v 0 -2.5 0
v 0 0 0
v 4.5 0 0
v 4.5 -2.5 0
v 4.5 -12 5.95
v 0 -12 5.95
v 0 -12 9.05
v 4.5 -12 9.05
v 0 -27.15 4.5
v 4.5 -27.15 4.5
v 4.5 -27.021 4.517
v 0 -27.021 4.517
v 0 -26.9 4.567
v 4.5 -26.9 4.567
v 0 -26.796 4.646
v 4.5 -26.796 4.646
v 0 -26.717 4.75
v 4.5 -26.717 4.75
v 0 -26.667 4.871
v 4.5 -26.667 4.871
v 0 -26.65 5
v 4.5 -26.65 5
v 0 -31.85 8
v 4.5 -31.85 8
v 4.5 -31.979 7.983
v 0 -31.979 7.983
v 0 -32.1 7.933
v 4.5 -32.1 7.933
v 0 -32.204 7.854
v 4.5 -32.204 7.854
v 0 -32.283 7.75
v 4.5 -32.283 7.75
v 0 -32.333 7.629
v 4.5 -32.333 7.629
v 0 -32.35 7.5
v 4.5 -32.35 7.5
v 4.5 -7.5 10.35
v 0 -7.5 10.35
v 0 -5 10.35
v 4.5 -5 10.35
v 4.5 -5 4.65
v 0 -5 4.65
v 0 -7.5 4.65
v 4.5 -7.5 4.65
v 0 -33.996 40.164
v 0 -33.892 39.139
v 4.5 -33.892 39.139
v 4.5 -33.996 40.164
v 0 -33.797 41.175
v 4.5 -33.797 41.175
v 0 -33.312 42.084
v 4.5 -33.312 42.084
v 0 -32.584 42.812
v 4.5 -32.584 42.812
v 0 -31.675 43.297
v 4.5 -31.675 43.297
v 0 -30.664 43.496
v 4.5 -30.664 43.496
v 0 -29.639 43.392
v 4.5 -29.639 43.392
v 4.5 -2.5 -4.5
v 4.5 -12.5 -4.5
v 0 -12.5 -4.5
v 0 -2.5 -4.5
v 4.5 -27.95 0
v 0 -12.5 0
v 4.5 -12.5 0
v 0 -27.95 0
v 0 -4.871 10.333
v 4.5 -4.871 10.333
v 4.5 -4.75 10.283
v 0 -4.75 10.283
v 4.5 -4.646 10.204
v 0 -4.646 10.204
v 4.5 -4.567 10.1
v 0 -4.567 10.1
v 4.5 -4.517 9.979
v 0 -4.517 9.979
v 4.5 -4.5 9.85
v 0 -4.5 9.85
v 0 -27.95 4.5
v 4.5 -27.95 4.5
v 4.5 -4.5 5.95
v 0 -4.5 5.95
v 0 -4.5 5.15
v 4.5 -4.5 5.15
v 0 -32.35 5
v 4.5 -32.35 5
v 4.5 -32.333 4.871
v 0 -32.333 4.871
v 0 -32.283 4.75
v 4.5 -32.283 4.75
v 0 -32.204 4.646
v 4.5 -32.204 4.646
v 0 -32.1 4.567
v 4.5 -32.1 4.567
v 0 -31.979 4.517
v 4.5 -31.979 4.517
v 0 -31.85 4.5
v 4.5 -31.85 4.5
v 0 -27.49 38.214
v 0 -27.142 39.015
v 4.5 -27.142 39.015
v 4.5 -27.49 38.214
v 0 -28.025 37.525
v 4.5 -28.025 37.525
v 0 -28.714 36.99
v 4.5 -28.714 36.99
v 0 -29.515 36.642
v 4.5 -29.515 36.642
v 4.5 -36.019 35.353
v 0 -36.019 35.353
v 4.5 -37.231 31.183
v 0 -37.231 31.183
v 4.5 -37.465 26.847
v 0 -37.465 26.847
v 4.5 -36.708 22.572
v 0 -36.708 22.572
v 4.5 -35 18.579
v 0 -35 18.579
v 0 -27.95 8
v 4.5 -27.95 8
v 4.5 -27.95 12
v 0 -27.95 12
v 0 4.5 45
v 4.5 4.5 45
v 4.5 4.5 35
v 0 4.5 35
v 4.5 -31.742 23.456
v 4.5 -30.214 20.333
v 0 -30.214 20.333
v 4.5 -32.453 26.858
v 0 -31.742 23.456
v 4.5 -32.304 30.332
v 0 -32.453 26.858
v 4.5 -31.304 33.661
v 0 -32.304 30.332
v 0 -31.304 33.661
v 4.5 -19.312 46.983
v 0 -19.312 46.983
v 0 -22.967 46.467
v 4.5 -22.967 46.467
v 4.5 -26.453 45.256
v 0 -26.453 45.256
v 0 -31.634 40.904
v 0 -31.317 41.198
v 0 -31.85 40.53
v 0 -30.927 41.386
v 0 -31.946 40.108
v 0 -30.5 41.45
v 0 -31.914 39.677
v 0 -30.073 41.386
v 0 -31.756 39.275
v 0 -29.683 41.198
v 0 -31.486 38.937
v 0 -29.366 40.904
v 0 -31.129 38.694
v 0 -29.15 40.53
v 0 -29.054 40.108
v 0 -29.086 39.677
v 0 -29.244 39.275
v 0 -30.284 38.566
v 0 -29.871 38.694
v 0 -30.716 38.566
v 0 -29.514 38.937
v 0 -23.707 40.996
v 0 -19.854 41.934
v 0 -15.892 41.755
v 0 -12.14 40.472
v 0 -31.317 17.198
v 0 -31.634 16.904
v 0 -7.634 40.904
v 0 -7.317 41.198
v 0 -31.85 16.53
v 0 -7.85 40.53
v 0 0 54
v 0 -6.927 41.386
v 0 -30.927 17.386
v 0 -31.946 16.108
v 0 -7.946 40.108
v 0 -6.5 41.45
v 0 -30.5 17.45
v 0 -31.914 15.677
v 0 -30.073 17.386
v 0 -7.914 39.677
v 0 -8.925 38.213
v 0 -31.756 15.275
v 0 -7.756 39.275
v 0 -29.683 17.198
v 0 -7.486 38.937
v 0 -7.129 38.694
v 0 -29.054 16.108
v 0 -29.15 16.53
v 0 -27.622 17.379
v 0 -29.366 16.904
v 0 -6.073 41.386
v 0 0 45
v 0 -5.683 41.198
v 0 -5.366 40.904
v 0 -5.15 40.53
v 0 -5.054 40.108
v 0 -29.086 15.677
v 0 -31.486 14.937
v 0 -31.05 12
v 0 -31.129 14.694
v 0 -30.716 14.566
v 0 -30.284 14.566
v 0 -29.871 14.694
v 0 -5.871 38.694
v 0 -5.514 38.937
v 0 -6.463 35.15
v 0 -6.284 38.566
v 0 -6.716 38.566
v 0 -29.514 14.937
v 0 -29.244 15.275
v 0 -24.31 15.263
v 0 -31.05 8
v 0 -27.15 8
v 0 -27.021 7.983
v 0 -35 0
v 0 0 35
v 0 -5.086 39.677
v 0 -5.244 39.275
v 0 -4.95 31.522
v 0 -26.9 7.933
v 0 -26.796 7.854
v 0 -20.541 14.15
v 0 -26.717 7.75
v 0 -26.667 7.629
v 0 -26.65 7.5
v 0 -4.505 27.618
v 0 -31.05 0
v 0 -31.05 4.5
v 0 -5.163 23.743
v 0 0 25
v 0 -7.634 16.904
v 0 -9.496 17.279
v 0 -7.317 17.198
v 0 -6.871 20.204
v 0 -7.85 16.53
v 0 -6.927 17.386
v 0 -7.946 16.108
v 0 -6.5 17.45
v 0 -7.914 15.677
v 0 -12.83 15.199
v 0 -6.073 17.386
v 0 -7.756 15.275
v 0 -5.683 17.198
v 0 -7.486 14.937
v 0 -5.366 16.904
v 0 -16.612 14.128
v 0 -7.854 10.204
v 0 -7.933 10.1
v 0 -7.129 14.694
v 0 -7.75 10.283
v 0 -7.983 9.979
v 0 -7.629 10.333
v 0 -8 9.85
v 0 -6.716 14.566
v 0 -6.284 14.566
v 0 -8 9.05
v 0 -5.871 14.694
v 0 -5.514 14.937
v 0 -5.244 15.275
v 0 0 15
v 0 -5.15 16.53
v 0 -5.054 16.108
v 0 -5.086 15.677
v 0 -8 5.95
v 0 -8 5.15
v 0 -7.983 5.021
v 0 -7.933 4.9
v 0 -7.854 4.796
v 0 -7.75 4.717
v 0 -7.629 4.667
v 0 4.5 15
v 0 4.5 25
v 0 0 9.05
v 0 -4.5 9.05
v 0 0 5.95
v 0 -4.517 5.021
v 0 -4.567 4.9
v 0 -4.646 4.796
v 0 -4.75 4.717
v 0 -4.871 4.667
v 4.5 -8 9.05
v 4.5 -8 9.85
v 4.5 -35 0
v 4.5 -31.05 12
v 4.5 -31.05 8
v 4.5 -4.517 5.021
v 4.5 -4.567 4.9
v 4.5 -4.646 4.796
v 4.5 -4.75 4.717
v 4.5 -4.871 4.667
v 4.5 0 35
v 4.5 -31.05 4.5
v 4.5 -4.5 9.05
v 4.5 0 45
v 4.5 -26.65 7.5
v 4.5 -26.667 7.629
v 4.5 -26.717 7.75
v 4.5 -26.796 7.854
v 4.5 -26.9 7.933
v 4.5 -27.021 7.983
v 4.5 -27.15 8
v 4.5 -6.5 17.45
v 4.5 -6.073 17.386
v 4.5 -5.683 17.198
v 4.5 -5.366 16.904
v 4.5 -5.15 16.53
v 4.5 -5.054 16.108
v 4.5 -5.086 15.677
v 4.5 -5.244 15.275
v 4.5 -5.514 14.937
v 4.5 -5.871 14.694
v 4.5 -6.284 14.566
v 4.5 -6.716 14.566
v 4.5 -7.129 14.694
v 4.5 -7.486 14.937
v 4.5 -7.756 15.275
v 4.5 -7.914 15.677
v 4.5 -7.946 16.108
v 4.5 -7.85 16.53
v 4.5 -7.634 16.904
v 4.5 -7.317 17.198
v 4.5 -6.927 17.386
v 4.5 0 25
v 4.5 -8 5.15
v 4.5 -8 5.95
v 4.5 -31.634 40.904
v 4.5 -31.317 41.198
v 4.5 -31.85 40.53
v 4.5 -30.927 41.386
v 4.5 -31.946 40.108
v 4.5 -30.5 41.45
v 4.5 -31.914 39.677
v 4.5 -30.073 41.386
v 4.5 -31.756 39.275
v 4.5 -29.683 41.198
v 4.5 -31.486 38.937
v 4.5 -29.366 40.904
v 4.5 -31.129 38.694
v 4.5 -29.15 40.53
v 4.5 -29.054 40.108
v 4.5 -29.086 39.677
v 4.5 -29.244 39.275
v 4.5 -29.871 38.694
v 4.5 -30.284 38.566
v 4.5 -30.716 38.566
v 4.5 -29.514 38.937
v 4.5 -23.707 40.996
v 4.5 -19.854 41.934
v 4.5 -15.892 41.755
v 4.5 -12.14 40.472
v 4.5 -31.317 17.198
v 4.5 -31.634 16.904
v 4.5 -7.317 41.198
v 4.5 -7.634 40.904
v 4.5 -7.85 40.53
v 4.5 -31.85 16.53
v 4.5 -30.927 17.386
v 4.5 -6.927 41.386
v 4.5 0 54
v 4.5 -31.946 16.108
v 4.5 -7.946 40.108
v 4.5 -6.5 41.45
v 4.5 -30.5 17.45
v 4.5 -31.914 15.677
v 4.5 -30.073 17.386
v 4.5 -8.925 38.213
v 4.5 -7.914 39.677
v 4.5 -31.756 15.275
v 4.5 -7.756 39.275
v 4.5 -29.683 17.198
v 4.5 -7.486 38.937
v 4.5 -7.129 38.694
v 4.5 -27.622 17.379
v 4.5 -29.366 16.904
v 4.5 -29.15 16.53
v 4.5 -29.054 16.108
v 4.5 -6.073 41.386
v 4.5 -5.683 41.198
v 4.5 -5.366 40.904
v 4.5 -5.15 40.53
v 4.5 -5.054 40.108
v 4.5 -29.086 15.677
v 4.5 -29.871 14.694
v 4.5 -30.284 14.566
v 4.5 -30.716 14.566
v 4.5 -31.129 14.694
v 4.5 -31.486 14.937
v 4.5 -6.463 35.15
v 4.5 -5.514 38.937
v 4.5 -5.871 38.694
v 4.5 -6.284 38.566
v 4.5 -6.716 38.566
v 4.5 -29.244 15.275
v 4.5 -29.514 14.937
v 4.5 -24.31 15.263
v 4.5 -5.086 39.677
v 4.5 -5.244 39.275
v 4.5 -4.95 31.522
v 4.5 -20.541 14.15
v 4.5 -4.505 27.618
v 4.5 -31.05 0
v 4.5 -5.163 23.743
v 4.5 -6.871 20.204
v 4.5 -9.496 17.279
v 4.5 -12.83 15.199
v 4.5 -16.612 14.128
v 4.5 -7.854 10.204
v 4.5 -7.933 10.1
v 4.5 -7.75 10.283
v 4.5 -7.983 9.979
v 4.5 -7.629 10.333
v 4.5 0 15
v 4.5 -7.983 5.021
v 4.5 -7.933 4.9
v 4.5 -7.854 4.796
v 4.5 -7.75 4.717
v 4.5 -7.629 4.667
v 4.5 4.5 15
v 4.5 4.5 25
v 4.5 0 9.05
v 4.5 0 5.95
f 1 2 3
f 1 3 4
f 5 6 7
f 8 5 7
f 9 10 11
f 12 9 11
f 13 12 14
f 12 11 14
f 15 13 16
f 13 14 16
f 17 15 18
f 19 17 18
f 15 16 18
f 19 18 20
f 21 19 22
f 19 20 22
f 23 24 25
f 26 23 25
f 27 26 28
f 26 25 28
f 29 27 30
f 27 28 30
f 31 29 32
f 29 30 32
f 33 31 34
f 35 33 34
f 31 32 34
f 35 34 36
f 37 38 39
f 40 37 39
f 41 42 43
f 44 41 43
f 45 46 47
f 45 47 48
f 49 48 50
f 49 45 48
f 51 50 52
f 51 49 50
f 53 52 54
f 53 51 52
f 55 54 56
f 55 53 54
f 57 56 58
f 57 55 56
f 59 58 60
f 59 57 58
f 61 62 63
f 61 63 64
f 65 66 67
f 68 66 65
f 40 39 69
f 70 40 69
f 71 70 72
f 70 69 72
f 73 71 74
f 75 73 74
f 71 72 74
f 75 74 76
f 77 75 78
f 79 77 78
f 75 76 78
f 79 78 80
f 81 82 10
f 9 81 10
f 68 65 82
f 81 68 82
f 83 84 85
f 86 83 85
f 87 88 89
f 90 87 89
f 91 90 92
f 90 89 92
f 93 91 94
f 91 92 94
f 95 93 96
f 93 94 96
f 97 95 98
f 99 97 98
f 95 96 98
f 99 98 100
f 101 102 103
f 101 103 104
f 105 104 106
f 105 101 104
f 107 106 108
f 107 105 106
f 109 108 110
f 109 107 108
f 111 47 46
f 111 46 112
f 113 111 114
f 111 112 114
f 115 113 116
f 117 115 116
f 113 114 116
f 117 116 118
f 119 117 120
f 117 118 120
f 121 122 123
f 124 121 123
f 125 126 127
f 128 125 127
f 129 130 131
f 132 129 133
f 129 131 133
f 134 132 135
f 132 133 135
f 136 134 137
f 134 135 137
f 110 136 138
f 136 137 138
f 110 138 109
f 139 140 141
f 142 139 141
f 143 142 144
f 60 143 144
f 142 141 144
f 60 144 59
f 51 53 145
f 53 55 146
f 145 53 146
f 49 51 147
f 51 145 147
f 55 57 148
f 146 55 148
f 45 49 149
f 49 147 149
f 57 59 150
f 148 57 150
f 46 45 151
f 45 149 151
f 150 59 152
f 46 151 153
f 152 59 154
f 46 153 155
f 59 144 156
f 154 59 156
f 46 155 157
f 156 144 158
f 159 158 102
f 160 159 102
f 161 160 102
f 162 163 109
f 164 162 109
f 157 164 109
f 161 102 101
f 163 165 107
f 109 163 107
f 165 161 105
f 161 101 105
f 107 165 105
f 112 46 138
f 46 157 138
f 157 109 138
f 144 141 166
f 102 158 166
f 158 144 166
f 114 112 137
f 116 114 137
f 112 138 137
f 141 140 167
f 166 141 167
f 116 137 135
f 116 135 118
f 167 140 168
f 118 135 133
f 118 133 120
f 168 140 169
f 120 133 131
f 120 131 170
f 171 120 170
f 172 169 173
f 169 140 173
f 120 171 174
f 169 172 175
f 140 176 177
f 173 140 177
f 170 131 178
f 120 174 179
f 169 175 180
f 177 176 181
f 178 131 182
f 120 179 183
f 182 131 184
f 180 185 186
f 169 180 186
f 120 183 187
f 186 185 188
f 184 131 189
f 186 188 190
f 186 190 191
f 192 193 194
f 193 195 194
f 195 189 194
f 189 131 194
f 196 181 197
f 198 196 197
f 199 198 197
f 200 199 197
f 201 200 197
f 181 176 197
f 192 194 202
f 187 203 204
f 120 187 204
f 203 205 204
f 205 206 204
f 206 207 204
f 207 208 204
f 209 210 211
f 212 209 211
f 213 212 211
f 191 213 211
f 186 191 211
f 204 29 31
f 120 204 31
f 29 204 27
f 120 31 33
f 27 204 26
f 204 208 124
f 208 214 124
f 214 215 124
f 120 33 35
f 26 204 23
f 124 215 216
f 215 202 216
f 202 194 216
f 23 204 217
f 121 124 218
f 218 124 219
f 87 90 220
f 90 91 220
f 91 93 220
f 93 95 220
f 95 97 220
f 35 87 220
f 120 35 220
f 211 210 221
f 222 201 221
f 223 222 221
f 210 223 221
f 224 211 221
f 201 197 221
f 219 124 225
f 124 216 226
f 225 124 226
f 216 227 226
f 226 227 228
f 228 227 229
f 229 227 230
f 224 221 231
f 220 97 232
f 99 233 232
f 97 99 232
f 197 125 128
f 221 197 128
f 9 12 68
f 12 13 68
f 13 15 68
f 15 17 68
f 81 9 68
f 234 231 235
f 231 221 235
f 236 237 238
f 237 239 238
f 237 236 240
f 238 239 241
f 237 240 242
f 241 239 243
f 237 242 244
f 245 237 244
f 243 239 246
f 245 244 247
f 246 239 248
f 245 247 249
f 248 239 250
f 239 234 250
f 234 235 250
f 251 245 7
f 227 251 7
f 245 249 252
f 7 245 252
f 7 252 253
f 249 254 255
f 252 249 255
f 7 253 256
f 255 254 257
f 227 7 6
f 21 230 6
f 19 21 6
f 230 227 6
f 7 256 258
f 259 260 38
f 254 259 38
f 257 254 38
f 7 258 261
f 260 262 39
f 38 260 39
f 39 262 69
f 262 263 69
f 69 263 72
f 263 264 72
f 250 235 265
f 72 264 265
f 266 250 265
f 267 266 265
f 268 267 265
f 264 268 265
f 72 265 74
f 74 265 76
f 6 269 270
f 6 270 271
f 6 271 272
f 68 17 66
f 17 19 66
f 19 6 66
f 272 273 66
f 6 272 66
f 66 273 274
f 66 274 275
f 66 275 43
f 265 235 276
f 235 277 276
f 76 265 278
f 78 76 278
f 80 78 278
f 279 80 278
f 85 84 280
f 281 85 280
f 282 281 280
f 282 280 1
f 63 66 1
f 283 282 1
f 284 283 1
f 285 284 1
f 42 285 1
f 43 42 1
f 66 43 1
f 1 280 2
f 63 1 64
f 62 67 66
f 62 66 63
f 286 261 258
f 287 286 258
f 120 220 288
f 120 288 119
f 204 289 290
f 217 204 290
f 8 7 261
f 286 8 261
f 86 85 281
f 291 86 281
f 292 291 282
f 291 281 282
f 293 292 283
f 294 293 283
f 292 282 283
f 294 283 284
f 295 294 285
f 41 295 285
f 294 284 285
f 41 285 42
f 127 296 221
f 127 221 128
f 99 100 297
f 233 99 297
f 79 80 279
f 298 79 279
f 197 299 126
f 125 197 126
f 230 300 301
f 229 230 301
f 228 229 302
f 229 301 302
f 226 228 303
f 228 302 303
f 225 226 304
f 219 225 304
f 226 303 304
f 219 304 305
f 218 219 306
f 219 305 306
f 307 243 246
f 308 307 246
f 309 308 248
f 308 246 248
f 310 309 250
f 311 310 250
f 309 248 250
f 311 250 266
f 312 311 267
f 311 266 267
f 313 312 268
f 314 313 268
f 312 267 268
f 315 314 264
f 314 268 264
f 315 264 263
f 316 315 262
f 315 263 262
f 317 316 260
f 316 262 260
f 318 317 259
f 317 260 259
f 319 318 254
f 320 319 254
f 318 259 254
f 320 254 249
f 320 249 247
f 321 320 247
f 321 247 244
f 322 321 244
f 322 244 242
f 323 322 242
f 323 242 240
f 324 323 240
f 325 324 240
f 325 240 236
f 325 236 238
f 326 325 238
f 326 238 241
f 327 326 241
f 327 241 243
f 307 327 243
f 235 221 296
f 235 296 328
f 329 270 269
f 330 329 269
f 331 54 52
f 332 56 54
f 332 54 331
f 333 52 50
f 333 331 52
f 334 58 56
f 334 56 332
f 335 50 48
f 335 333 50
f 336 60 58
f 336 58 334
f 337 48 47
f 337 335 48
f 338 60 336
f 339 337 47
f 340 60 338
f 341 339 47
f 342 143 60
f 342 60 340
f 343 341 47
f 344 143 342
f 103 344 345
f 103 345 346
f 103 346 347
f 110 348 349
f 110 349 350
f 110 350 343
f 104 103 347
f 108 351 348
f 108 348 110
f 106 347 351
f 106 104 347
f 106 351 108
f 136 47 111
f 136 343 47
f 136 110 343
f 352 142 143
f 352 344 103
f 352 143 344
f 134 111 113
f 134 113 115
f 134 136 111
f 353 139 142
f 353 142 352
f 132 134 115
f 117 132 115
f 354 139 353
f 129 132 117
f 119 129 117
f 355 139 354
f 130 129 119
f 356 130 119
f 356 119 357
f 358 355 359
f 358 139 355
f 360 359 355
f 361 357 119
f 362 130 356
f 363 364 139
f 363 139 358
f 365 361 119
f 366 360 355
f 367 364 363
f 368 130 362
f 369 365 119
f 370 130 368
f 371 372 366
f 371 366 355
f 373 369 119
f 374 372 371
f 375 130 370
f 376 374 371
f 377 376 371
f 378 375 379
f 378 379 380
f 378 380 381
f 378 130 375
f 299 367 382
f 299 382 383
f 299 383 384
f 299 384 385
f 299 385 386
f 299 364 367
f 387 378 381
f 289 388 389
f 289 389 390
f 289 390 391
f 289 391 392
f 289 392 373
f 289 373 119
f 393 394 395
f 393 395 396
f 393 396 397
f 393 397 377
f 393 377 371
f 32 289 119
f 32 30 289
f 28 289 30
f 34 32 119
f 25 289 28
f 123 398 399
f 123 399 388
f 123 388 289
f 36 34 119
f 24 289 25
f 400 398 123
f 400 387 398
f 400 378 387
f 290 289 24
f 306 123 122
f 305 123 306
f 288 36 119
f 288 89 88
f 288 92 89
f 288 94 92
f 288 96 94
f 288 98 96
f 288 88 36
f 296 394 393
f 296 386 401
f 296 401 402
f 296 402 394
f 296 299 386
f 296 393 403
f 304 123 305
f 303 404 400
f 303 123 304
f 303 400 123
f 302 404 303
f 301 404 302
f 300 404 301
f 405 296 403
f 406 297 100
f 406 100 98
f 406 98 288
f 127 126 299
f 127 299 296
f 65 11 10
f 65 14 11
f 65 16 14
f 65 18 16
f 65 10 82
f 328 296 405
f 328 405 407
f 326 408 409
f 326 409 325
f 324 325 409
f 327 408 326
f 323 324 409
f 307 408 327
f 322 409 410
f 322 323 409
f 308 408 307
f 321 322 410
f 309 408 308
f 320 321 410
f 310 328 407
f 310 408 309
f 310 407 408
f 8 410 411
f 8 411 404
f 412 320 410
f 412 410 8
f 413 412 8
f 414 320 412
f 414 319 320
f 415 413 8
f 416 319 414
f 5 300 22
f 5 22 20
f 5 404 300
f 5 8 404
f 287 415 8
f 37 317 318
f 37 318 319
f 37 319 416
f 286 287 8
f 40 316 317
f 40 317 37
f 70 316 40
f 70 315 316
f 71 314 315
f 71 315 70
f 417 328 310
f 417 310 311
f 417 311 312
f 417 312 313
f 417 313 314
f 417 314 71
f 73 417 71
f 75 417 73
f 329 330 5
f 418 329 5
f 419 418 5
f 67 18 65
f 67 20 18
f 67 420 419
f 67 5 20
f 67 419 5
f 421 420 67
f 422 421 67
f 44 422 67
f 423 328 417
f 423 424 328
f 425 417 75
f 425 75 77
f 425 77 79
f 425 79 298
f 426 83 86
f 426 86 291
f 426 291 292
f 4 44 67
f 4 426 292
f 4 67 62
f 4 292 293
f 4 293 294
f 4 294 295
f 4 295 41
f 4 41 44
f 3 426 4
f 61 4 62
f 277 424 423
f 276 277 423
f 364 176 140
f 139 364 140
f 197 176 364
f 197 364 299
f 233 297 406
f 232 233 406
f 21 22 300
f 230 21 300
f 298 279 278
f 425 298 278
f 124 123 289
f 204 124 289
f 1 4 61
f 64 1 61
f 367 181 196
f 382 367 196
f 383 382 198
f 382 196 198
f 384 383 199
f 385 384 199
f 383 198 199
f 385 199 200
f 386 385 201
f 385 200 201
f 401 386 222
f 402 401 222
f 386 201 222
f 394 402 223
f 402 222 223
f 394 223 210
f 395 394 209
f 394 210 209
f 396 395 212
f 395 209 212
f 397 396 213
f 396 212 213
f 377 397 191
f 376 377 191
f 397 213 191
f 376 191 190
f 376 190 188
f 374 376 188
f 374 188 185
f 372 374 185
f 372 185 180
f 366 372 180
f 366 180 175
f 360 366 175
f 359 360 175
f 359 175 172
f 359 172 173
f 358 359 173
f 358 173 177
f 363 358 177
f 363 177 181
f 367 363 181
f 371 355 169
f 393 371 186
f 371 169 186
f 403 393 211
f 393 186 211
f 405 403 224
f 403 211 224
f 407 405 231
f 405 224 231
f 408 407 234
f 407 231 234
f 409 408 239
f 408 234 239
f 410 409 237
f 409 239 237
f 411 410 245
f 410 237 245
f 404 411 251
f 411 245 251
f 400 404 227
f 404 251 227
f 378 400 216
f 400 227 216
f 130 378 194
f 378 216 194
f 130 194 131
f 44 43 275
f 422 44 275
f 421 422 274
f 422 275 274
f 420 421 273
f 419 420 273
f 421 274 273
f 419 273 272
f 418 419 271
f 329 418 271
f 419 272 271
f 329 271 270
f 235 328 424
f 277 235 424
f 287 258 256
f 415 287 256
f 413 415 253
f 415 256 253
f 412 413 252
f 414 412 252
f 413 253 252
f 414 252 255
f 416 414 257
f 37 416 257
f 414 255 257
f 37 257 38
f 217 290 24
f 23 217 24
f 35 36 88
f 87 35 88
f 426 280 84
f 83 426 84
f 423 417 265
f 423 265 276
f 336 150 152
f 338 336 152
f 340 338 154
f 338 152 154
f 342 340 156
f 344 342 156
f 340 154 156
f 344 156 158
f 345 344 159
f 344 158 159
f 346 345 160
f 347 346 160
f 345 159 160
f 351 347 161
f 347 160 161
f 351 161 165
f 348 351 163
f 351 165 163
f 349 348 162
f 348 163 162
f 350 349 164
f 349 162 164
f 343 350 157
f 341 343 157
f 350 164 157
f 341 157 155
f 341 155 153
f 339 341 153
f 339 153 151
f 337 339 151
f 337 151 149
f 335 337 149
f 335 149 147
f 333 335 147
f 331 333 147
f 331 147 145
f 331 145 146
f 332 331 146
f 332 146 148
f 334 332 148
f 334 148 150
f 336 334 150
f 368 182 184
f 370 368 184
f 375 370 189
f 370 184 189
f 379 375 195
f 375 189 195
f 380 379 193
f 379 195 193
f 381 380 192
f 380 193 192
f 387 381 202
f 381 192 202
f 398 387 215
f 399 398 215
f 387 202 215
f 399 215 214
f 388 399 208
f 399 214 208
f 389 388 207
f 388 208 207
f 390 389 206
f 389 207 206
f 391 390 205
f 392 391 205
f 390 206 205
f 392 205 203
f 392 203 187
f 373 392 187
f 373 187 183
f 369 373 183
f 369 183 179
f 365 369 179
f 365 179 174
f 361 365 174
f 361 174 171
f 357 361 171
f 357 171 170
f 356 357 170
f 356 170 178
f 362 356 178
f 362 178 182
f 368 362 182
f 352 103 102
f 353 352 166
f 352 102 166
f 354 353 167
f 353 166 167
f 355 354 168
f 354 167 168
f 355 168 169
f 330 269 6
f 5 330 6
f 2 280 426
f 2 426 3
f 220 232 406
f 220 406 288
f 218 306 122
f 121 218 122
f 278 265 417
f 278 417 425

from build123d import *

# Parameters (mm, degrees)
BOSS_EXTRUDE1_DEPTH  = 4.5
SKETCH2_W            = 9
SKETCH2_H            = 10
BOSS_EXTRUDE2_DEPTH  = 4.5
BOSS_EXTRUDE3_DEPTH  = 4.5
CUT_EXTRUDE1_DEPTH   = 65.507751472
SKETCH5_W            = 10
SKETCH5_H            = 4.5
BOSS_EXTRUDE4_DEPTH  = 4.5
CUT_EXTRUDE4_DEPTH   = 65.507751472
SKETCH12_R           = 14
SKETCH12_R_2         = 1.45
FANCUTOUT_DEPTH      = 65.507751472
BOSS_EXTRUDE7_DEPTH  = 4.5
SKETCH14_R           = 3.5
BOSS_EXTRUDE8_DEPTH  = 4.5
SKETCH15_R           = 1.45
CUT_EXTRUDE6_DEPTH   = 66.897647909
BOSS_EXTRUDE13_DEPTH = 4.5
BOSS_EXTRUDE15_DEPTH = 4.5


with BuildPart() as part:
    # Sketch1 → Boss-Extrude1 (new body)
    with BuildSketch(Plane(origin=(0, 0, 0), x_dir=(0, 0, -1), z_dir=(1, 0, 0))):
        Polygon((0, 0), (0, -35), (-54, 0), align=None)
    extrude(amount=BOSS_EXTRUDE1_DEPTH)

    # Sketch2 → Boss-Extrude2 (add, through all)
    with BuildSketch(Plane(origin=(4.5, 0, 0), x_dir=(0, 0, -1), z_dir=(1, 0, 0))):
        with Locations((0, -7.5)):
            Rectangle(SKETCH2_W, SKETCH2_H)
    extrude(amount=-BOSS_EXTRUDE2_DEPTH)

    # Sketch3 → Boss-Extrude3 (add, through all)
    with BuildSketch(Plane(origin=(4.5, 0, 0), x_dir=(0, 0, -1), z_dir=(1, 0, 0))):
        Polygon((0, -35), (-15, -35), (-54, 0), (0, -25), align=None)
    extrude(amount=-BOSS_EXTRUDE3_DEPTH)

    # Sketch4 → Cut-Extrude1 (cut, through all)
    with BuildSketch(Plane(origin=(4.5, 0, 0), x_dir=(0, 0, -1), z_dir=(1, 0, 0))):
        with BuildLine():
            Line((0, -31.05), (0, -27.95))
            Line((0, -27.95), (-4.5, -27.95))
            Line((-4.5, -27.95), (-4.5, -27.15))
            ThreePointArc((-4.5, -27.15), (-4.646446609, -26.796446609), (-5, -26.65))
            Line((-5, -26.65), (-7.5, -26.65))
            ThreePointArc((-7.5, -26.65), (-7.853553391, -26.796446609), (-8, -27.15))
            Line((-8, -27.15), (-8, -27.95))
            Line((-8, -27.95), (-12, -27.95))
            Line((-12, -27.95), (-12, -31.05))
            Line((-12, -31.05), (-8, -31.05))
            Line((-8, -31.05), (-8, -31.85))
            ThreePointArc((-8, -31.85), (-7.853553391, -32.203553391), (-7.5, -32.35))
            Line((-7.5, -32.35), (-5, -32.35))
            ThreePointArc((-5, -32.35), (-4.646446609, -32.203553391), (-4.5, -31.85))
            Line((-4.5, -31.85), (-4.5, -31.05))
            Line((-4.5, -31.05), (0, -31.05))
        make_face()
    extrude(amount=-CUT_EXTRUDE1_DEPTH, mode=Mode.SUBTRACT)

    # Sketch5 → Boss-Extrude4 (add, through all)
    with BuildSketch(Plane(origin=(4.5, 0, 0), x_dir=(0, 0, -1), z_dir=(1, 0, 0))):
        with Locations((-20, 2.25)):
            Rectangle(SKETCH5_W, SKETCH5_H)
        with Locations((-40, 2.25)):
            Rectangle(SKETCH5_W, SKETCH5_H)
    extrude(amount=-BOSS_EXTRUDE4_DEPTH)

    # Sketch11 → Cut-Extrude4 (cut, through all)
    with BuildSketch(Plane.ZY):
        with BuildLine():
            Line((5.95, -12), (9.05, -12))
            Line((9.05, -12), (9.05, -8))
            Line((9.05, -8), (9.85, -8))
            ThreePointArc((9.85, -8), (10.203553391, -7.853553391), (10.35, -7.5))
            Line((10.35, -7.5), (10.35, -5))
            ThreePointArc((10.35, -5), (10.203553391, -4.646446609), (9.85, -4.5))
            Line((9.85, -4.5), (9.05, -4.5))
            Line((9.05, -4.5), (9.05, 0))
            Line((9.05, 0), (5.95, 0))
            Line((5.95, 0), (5.95, -4.5))
            Line((5.95, -4.5), (5.15, -4.5))
            ThreePointArc((5.15, -4.5), (4.796446609, -4.646446609), (4.65, -5))
            Line((4.65, -5), (4.65, -7.5))
            ThreePointArc((4.65, -7.5), (4.796446609, -7.853553391), (5.15, -8))
            Line((5.15, -8), (5.95, -8))
            Line((5.95, -8), (5.95, -12))
        make_face()
    extrude(amount=-CUT_EXTRUDE4_DEPTH, mode=Mode.SUBTRACT)

    # Sketch12 → FanCutout (cut, through all)
    with BuildSketch(Plane.ZY):
        with Locations((28, -18.5)):
            Circle(SKETCH12_R)
        with Locations((16, -6.5)):
            Circle(SKETCH12_R_2)
        with Locations((40, -6.5)):
            Circle(SKETCH12_R_2)
        with Locations((16, -30.5)):
            Circle(SKETCH12_R_2)
    extrude(amount=-FANCUTOUT_DEPTH, mode=Mode.SUBTRACT)

    # Sketch13 → Boss-Extrude7 (add, through all)
    with BuildSketch(Plane.ZY):
        with BuildLine():
            Line((39.407071777, -10.383429697), (43.481025983, -7.484654589))
            ThreePointArc((43.481025983, -7.484654589), (41.102709954, -32.259323816), (16.241427695, -33.424341772))
            Line((16.241427695, -33.424341772), (19.335788828, -29.496883411))
            ThreePointArc((19.335788828, -29.496883411), (37.654628387, -28.638449127), (39.407071777, -10.383429697))
        make_face()
    extrude(amount=-BOSS_EXTRUDE7_DEPTH)

    # Sketch14 → Boss-Extrude8 (add, through all)
    with BuildSketch(Plane.ZY):
        with Locations((40, -30.5)):
            Circle(SKETCH14_R)
    extrude(amount=-BOSS_EXTRUDE8_DEPTH)

    # Sketch15 → Cut-Extrude6 (cut, through all)
    with BuildSketch(Plane.ZY):
        with Locations((40, -30.5)):
            Circle(SKETCH15_R)
    extrude(amount=-CUT_EXTRUDE6_DEPTH, mode=Mode.SUBTRACT)

    # Sketch24 → Boss-Extrude13 (add, through all)
    with BuildSketch(Plane.ZY):
        Polygon((15, -35), (20, -35), (16, -31.95), align=None)
    extrude(amount=-BOSS_EXTRUDE13_DEPTH)

    # Sketch25 → Boss-Extrude15 (add, through all)
    with BuildSketch(Plane.ZY):
        Polygon((54, 0), (46.982638315, -19.312060719), (44.28744936, -8.7163916), align=None)
    extrude(amount=-BOSS_EXTRUDE15_DEPTH)


solid = part.part
